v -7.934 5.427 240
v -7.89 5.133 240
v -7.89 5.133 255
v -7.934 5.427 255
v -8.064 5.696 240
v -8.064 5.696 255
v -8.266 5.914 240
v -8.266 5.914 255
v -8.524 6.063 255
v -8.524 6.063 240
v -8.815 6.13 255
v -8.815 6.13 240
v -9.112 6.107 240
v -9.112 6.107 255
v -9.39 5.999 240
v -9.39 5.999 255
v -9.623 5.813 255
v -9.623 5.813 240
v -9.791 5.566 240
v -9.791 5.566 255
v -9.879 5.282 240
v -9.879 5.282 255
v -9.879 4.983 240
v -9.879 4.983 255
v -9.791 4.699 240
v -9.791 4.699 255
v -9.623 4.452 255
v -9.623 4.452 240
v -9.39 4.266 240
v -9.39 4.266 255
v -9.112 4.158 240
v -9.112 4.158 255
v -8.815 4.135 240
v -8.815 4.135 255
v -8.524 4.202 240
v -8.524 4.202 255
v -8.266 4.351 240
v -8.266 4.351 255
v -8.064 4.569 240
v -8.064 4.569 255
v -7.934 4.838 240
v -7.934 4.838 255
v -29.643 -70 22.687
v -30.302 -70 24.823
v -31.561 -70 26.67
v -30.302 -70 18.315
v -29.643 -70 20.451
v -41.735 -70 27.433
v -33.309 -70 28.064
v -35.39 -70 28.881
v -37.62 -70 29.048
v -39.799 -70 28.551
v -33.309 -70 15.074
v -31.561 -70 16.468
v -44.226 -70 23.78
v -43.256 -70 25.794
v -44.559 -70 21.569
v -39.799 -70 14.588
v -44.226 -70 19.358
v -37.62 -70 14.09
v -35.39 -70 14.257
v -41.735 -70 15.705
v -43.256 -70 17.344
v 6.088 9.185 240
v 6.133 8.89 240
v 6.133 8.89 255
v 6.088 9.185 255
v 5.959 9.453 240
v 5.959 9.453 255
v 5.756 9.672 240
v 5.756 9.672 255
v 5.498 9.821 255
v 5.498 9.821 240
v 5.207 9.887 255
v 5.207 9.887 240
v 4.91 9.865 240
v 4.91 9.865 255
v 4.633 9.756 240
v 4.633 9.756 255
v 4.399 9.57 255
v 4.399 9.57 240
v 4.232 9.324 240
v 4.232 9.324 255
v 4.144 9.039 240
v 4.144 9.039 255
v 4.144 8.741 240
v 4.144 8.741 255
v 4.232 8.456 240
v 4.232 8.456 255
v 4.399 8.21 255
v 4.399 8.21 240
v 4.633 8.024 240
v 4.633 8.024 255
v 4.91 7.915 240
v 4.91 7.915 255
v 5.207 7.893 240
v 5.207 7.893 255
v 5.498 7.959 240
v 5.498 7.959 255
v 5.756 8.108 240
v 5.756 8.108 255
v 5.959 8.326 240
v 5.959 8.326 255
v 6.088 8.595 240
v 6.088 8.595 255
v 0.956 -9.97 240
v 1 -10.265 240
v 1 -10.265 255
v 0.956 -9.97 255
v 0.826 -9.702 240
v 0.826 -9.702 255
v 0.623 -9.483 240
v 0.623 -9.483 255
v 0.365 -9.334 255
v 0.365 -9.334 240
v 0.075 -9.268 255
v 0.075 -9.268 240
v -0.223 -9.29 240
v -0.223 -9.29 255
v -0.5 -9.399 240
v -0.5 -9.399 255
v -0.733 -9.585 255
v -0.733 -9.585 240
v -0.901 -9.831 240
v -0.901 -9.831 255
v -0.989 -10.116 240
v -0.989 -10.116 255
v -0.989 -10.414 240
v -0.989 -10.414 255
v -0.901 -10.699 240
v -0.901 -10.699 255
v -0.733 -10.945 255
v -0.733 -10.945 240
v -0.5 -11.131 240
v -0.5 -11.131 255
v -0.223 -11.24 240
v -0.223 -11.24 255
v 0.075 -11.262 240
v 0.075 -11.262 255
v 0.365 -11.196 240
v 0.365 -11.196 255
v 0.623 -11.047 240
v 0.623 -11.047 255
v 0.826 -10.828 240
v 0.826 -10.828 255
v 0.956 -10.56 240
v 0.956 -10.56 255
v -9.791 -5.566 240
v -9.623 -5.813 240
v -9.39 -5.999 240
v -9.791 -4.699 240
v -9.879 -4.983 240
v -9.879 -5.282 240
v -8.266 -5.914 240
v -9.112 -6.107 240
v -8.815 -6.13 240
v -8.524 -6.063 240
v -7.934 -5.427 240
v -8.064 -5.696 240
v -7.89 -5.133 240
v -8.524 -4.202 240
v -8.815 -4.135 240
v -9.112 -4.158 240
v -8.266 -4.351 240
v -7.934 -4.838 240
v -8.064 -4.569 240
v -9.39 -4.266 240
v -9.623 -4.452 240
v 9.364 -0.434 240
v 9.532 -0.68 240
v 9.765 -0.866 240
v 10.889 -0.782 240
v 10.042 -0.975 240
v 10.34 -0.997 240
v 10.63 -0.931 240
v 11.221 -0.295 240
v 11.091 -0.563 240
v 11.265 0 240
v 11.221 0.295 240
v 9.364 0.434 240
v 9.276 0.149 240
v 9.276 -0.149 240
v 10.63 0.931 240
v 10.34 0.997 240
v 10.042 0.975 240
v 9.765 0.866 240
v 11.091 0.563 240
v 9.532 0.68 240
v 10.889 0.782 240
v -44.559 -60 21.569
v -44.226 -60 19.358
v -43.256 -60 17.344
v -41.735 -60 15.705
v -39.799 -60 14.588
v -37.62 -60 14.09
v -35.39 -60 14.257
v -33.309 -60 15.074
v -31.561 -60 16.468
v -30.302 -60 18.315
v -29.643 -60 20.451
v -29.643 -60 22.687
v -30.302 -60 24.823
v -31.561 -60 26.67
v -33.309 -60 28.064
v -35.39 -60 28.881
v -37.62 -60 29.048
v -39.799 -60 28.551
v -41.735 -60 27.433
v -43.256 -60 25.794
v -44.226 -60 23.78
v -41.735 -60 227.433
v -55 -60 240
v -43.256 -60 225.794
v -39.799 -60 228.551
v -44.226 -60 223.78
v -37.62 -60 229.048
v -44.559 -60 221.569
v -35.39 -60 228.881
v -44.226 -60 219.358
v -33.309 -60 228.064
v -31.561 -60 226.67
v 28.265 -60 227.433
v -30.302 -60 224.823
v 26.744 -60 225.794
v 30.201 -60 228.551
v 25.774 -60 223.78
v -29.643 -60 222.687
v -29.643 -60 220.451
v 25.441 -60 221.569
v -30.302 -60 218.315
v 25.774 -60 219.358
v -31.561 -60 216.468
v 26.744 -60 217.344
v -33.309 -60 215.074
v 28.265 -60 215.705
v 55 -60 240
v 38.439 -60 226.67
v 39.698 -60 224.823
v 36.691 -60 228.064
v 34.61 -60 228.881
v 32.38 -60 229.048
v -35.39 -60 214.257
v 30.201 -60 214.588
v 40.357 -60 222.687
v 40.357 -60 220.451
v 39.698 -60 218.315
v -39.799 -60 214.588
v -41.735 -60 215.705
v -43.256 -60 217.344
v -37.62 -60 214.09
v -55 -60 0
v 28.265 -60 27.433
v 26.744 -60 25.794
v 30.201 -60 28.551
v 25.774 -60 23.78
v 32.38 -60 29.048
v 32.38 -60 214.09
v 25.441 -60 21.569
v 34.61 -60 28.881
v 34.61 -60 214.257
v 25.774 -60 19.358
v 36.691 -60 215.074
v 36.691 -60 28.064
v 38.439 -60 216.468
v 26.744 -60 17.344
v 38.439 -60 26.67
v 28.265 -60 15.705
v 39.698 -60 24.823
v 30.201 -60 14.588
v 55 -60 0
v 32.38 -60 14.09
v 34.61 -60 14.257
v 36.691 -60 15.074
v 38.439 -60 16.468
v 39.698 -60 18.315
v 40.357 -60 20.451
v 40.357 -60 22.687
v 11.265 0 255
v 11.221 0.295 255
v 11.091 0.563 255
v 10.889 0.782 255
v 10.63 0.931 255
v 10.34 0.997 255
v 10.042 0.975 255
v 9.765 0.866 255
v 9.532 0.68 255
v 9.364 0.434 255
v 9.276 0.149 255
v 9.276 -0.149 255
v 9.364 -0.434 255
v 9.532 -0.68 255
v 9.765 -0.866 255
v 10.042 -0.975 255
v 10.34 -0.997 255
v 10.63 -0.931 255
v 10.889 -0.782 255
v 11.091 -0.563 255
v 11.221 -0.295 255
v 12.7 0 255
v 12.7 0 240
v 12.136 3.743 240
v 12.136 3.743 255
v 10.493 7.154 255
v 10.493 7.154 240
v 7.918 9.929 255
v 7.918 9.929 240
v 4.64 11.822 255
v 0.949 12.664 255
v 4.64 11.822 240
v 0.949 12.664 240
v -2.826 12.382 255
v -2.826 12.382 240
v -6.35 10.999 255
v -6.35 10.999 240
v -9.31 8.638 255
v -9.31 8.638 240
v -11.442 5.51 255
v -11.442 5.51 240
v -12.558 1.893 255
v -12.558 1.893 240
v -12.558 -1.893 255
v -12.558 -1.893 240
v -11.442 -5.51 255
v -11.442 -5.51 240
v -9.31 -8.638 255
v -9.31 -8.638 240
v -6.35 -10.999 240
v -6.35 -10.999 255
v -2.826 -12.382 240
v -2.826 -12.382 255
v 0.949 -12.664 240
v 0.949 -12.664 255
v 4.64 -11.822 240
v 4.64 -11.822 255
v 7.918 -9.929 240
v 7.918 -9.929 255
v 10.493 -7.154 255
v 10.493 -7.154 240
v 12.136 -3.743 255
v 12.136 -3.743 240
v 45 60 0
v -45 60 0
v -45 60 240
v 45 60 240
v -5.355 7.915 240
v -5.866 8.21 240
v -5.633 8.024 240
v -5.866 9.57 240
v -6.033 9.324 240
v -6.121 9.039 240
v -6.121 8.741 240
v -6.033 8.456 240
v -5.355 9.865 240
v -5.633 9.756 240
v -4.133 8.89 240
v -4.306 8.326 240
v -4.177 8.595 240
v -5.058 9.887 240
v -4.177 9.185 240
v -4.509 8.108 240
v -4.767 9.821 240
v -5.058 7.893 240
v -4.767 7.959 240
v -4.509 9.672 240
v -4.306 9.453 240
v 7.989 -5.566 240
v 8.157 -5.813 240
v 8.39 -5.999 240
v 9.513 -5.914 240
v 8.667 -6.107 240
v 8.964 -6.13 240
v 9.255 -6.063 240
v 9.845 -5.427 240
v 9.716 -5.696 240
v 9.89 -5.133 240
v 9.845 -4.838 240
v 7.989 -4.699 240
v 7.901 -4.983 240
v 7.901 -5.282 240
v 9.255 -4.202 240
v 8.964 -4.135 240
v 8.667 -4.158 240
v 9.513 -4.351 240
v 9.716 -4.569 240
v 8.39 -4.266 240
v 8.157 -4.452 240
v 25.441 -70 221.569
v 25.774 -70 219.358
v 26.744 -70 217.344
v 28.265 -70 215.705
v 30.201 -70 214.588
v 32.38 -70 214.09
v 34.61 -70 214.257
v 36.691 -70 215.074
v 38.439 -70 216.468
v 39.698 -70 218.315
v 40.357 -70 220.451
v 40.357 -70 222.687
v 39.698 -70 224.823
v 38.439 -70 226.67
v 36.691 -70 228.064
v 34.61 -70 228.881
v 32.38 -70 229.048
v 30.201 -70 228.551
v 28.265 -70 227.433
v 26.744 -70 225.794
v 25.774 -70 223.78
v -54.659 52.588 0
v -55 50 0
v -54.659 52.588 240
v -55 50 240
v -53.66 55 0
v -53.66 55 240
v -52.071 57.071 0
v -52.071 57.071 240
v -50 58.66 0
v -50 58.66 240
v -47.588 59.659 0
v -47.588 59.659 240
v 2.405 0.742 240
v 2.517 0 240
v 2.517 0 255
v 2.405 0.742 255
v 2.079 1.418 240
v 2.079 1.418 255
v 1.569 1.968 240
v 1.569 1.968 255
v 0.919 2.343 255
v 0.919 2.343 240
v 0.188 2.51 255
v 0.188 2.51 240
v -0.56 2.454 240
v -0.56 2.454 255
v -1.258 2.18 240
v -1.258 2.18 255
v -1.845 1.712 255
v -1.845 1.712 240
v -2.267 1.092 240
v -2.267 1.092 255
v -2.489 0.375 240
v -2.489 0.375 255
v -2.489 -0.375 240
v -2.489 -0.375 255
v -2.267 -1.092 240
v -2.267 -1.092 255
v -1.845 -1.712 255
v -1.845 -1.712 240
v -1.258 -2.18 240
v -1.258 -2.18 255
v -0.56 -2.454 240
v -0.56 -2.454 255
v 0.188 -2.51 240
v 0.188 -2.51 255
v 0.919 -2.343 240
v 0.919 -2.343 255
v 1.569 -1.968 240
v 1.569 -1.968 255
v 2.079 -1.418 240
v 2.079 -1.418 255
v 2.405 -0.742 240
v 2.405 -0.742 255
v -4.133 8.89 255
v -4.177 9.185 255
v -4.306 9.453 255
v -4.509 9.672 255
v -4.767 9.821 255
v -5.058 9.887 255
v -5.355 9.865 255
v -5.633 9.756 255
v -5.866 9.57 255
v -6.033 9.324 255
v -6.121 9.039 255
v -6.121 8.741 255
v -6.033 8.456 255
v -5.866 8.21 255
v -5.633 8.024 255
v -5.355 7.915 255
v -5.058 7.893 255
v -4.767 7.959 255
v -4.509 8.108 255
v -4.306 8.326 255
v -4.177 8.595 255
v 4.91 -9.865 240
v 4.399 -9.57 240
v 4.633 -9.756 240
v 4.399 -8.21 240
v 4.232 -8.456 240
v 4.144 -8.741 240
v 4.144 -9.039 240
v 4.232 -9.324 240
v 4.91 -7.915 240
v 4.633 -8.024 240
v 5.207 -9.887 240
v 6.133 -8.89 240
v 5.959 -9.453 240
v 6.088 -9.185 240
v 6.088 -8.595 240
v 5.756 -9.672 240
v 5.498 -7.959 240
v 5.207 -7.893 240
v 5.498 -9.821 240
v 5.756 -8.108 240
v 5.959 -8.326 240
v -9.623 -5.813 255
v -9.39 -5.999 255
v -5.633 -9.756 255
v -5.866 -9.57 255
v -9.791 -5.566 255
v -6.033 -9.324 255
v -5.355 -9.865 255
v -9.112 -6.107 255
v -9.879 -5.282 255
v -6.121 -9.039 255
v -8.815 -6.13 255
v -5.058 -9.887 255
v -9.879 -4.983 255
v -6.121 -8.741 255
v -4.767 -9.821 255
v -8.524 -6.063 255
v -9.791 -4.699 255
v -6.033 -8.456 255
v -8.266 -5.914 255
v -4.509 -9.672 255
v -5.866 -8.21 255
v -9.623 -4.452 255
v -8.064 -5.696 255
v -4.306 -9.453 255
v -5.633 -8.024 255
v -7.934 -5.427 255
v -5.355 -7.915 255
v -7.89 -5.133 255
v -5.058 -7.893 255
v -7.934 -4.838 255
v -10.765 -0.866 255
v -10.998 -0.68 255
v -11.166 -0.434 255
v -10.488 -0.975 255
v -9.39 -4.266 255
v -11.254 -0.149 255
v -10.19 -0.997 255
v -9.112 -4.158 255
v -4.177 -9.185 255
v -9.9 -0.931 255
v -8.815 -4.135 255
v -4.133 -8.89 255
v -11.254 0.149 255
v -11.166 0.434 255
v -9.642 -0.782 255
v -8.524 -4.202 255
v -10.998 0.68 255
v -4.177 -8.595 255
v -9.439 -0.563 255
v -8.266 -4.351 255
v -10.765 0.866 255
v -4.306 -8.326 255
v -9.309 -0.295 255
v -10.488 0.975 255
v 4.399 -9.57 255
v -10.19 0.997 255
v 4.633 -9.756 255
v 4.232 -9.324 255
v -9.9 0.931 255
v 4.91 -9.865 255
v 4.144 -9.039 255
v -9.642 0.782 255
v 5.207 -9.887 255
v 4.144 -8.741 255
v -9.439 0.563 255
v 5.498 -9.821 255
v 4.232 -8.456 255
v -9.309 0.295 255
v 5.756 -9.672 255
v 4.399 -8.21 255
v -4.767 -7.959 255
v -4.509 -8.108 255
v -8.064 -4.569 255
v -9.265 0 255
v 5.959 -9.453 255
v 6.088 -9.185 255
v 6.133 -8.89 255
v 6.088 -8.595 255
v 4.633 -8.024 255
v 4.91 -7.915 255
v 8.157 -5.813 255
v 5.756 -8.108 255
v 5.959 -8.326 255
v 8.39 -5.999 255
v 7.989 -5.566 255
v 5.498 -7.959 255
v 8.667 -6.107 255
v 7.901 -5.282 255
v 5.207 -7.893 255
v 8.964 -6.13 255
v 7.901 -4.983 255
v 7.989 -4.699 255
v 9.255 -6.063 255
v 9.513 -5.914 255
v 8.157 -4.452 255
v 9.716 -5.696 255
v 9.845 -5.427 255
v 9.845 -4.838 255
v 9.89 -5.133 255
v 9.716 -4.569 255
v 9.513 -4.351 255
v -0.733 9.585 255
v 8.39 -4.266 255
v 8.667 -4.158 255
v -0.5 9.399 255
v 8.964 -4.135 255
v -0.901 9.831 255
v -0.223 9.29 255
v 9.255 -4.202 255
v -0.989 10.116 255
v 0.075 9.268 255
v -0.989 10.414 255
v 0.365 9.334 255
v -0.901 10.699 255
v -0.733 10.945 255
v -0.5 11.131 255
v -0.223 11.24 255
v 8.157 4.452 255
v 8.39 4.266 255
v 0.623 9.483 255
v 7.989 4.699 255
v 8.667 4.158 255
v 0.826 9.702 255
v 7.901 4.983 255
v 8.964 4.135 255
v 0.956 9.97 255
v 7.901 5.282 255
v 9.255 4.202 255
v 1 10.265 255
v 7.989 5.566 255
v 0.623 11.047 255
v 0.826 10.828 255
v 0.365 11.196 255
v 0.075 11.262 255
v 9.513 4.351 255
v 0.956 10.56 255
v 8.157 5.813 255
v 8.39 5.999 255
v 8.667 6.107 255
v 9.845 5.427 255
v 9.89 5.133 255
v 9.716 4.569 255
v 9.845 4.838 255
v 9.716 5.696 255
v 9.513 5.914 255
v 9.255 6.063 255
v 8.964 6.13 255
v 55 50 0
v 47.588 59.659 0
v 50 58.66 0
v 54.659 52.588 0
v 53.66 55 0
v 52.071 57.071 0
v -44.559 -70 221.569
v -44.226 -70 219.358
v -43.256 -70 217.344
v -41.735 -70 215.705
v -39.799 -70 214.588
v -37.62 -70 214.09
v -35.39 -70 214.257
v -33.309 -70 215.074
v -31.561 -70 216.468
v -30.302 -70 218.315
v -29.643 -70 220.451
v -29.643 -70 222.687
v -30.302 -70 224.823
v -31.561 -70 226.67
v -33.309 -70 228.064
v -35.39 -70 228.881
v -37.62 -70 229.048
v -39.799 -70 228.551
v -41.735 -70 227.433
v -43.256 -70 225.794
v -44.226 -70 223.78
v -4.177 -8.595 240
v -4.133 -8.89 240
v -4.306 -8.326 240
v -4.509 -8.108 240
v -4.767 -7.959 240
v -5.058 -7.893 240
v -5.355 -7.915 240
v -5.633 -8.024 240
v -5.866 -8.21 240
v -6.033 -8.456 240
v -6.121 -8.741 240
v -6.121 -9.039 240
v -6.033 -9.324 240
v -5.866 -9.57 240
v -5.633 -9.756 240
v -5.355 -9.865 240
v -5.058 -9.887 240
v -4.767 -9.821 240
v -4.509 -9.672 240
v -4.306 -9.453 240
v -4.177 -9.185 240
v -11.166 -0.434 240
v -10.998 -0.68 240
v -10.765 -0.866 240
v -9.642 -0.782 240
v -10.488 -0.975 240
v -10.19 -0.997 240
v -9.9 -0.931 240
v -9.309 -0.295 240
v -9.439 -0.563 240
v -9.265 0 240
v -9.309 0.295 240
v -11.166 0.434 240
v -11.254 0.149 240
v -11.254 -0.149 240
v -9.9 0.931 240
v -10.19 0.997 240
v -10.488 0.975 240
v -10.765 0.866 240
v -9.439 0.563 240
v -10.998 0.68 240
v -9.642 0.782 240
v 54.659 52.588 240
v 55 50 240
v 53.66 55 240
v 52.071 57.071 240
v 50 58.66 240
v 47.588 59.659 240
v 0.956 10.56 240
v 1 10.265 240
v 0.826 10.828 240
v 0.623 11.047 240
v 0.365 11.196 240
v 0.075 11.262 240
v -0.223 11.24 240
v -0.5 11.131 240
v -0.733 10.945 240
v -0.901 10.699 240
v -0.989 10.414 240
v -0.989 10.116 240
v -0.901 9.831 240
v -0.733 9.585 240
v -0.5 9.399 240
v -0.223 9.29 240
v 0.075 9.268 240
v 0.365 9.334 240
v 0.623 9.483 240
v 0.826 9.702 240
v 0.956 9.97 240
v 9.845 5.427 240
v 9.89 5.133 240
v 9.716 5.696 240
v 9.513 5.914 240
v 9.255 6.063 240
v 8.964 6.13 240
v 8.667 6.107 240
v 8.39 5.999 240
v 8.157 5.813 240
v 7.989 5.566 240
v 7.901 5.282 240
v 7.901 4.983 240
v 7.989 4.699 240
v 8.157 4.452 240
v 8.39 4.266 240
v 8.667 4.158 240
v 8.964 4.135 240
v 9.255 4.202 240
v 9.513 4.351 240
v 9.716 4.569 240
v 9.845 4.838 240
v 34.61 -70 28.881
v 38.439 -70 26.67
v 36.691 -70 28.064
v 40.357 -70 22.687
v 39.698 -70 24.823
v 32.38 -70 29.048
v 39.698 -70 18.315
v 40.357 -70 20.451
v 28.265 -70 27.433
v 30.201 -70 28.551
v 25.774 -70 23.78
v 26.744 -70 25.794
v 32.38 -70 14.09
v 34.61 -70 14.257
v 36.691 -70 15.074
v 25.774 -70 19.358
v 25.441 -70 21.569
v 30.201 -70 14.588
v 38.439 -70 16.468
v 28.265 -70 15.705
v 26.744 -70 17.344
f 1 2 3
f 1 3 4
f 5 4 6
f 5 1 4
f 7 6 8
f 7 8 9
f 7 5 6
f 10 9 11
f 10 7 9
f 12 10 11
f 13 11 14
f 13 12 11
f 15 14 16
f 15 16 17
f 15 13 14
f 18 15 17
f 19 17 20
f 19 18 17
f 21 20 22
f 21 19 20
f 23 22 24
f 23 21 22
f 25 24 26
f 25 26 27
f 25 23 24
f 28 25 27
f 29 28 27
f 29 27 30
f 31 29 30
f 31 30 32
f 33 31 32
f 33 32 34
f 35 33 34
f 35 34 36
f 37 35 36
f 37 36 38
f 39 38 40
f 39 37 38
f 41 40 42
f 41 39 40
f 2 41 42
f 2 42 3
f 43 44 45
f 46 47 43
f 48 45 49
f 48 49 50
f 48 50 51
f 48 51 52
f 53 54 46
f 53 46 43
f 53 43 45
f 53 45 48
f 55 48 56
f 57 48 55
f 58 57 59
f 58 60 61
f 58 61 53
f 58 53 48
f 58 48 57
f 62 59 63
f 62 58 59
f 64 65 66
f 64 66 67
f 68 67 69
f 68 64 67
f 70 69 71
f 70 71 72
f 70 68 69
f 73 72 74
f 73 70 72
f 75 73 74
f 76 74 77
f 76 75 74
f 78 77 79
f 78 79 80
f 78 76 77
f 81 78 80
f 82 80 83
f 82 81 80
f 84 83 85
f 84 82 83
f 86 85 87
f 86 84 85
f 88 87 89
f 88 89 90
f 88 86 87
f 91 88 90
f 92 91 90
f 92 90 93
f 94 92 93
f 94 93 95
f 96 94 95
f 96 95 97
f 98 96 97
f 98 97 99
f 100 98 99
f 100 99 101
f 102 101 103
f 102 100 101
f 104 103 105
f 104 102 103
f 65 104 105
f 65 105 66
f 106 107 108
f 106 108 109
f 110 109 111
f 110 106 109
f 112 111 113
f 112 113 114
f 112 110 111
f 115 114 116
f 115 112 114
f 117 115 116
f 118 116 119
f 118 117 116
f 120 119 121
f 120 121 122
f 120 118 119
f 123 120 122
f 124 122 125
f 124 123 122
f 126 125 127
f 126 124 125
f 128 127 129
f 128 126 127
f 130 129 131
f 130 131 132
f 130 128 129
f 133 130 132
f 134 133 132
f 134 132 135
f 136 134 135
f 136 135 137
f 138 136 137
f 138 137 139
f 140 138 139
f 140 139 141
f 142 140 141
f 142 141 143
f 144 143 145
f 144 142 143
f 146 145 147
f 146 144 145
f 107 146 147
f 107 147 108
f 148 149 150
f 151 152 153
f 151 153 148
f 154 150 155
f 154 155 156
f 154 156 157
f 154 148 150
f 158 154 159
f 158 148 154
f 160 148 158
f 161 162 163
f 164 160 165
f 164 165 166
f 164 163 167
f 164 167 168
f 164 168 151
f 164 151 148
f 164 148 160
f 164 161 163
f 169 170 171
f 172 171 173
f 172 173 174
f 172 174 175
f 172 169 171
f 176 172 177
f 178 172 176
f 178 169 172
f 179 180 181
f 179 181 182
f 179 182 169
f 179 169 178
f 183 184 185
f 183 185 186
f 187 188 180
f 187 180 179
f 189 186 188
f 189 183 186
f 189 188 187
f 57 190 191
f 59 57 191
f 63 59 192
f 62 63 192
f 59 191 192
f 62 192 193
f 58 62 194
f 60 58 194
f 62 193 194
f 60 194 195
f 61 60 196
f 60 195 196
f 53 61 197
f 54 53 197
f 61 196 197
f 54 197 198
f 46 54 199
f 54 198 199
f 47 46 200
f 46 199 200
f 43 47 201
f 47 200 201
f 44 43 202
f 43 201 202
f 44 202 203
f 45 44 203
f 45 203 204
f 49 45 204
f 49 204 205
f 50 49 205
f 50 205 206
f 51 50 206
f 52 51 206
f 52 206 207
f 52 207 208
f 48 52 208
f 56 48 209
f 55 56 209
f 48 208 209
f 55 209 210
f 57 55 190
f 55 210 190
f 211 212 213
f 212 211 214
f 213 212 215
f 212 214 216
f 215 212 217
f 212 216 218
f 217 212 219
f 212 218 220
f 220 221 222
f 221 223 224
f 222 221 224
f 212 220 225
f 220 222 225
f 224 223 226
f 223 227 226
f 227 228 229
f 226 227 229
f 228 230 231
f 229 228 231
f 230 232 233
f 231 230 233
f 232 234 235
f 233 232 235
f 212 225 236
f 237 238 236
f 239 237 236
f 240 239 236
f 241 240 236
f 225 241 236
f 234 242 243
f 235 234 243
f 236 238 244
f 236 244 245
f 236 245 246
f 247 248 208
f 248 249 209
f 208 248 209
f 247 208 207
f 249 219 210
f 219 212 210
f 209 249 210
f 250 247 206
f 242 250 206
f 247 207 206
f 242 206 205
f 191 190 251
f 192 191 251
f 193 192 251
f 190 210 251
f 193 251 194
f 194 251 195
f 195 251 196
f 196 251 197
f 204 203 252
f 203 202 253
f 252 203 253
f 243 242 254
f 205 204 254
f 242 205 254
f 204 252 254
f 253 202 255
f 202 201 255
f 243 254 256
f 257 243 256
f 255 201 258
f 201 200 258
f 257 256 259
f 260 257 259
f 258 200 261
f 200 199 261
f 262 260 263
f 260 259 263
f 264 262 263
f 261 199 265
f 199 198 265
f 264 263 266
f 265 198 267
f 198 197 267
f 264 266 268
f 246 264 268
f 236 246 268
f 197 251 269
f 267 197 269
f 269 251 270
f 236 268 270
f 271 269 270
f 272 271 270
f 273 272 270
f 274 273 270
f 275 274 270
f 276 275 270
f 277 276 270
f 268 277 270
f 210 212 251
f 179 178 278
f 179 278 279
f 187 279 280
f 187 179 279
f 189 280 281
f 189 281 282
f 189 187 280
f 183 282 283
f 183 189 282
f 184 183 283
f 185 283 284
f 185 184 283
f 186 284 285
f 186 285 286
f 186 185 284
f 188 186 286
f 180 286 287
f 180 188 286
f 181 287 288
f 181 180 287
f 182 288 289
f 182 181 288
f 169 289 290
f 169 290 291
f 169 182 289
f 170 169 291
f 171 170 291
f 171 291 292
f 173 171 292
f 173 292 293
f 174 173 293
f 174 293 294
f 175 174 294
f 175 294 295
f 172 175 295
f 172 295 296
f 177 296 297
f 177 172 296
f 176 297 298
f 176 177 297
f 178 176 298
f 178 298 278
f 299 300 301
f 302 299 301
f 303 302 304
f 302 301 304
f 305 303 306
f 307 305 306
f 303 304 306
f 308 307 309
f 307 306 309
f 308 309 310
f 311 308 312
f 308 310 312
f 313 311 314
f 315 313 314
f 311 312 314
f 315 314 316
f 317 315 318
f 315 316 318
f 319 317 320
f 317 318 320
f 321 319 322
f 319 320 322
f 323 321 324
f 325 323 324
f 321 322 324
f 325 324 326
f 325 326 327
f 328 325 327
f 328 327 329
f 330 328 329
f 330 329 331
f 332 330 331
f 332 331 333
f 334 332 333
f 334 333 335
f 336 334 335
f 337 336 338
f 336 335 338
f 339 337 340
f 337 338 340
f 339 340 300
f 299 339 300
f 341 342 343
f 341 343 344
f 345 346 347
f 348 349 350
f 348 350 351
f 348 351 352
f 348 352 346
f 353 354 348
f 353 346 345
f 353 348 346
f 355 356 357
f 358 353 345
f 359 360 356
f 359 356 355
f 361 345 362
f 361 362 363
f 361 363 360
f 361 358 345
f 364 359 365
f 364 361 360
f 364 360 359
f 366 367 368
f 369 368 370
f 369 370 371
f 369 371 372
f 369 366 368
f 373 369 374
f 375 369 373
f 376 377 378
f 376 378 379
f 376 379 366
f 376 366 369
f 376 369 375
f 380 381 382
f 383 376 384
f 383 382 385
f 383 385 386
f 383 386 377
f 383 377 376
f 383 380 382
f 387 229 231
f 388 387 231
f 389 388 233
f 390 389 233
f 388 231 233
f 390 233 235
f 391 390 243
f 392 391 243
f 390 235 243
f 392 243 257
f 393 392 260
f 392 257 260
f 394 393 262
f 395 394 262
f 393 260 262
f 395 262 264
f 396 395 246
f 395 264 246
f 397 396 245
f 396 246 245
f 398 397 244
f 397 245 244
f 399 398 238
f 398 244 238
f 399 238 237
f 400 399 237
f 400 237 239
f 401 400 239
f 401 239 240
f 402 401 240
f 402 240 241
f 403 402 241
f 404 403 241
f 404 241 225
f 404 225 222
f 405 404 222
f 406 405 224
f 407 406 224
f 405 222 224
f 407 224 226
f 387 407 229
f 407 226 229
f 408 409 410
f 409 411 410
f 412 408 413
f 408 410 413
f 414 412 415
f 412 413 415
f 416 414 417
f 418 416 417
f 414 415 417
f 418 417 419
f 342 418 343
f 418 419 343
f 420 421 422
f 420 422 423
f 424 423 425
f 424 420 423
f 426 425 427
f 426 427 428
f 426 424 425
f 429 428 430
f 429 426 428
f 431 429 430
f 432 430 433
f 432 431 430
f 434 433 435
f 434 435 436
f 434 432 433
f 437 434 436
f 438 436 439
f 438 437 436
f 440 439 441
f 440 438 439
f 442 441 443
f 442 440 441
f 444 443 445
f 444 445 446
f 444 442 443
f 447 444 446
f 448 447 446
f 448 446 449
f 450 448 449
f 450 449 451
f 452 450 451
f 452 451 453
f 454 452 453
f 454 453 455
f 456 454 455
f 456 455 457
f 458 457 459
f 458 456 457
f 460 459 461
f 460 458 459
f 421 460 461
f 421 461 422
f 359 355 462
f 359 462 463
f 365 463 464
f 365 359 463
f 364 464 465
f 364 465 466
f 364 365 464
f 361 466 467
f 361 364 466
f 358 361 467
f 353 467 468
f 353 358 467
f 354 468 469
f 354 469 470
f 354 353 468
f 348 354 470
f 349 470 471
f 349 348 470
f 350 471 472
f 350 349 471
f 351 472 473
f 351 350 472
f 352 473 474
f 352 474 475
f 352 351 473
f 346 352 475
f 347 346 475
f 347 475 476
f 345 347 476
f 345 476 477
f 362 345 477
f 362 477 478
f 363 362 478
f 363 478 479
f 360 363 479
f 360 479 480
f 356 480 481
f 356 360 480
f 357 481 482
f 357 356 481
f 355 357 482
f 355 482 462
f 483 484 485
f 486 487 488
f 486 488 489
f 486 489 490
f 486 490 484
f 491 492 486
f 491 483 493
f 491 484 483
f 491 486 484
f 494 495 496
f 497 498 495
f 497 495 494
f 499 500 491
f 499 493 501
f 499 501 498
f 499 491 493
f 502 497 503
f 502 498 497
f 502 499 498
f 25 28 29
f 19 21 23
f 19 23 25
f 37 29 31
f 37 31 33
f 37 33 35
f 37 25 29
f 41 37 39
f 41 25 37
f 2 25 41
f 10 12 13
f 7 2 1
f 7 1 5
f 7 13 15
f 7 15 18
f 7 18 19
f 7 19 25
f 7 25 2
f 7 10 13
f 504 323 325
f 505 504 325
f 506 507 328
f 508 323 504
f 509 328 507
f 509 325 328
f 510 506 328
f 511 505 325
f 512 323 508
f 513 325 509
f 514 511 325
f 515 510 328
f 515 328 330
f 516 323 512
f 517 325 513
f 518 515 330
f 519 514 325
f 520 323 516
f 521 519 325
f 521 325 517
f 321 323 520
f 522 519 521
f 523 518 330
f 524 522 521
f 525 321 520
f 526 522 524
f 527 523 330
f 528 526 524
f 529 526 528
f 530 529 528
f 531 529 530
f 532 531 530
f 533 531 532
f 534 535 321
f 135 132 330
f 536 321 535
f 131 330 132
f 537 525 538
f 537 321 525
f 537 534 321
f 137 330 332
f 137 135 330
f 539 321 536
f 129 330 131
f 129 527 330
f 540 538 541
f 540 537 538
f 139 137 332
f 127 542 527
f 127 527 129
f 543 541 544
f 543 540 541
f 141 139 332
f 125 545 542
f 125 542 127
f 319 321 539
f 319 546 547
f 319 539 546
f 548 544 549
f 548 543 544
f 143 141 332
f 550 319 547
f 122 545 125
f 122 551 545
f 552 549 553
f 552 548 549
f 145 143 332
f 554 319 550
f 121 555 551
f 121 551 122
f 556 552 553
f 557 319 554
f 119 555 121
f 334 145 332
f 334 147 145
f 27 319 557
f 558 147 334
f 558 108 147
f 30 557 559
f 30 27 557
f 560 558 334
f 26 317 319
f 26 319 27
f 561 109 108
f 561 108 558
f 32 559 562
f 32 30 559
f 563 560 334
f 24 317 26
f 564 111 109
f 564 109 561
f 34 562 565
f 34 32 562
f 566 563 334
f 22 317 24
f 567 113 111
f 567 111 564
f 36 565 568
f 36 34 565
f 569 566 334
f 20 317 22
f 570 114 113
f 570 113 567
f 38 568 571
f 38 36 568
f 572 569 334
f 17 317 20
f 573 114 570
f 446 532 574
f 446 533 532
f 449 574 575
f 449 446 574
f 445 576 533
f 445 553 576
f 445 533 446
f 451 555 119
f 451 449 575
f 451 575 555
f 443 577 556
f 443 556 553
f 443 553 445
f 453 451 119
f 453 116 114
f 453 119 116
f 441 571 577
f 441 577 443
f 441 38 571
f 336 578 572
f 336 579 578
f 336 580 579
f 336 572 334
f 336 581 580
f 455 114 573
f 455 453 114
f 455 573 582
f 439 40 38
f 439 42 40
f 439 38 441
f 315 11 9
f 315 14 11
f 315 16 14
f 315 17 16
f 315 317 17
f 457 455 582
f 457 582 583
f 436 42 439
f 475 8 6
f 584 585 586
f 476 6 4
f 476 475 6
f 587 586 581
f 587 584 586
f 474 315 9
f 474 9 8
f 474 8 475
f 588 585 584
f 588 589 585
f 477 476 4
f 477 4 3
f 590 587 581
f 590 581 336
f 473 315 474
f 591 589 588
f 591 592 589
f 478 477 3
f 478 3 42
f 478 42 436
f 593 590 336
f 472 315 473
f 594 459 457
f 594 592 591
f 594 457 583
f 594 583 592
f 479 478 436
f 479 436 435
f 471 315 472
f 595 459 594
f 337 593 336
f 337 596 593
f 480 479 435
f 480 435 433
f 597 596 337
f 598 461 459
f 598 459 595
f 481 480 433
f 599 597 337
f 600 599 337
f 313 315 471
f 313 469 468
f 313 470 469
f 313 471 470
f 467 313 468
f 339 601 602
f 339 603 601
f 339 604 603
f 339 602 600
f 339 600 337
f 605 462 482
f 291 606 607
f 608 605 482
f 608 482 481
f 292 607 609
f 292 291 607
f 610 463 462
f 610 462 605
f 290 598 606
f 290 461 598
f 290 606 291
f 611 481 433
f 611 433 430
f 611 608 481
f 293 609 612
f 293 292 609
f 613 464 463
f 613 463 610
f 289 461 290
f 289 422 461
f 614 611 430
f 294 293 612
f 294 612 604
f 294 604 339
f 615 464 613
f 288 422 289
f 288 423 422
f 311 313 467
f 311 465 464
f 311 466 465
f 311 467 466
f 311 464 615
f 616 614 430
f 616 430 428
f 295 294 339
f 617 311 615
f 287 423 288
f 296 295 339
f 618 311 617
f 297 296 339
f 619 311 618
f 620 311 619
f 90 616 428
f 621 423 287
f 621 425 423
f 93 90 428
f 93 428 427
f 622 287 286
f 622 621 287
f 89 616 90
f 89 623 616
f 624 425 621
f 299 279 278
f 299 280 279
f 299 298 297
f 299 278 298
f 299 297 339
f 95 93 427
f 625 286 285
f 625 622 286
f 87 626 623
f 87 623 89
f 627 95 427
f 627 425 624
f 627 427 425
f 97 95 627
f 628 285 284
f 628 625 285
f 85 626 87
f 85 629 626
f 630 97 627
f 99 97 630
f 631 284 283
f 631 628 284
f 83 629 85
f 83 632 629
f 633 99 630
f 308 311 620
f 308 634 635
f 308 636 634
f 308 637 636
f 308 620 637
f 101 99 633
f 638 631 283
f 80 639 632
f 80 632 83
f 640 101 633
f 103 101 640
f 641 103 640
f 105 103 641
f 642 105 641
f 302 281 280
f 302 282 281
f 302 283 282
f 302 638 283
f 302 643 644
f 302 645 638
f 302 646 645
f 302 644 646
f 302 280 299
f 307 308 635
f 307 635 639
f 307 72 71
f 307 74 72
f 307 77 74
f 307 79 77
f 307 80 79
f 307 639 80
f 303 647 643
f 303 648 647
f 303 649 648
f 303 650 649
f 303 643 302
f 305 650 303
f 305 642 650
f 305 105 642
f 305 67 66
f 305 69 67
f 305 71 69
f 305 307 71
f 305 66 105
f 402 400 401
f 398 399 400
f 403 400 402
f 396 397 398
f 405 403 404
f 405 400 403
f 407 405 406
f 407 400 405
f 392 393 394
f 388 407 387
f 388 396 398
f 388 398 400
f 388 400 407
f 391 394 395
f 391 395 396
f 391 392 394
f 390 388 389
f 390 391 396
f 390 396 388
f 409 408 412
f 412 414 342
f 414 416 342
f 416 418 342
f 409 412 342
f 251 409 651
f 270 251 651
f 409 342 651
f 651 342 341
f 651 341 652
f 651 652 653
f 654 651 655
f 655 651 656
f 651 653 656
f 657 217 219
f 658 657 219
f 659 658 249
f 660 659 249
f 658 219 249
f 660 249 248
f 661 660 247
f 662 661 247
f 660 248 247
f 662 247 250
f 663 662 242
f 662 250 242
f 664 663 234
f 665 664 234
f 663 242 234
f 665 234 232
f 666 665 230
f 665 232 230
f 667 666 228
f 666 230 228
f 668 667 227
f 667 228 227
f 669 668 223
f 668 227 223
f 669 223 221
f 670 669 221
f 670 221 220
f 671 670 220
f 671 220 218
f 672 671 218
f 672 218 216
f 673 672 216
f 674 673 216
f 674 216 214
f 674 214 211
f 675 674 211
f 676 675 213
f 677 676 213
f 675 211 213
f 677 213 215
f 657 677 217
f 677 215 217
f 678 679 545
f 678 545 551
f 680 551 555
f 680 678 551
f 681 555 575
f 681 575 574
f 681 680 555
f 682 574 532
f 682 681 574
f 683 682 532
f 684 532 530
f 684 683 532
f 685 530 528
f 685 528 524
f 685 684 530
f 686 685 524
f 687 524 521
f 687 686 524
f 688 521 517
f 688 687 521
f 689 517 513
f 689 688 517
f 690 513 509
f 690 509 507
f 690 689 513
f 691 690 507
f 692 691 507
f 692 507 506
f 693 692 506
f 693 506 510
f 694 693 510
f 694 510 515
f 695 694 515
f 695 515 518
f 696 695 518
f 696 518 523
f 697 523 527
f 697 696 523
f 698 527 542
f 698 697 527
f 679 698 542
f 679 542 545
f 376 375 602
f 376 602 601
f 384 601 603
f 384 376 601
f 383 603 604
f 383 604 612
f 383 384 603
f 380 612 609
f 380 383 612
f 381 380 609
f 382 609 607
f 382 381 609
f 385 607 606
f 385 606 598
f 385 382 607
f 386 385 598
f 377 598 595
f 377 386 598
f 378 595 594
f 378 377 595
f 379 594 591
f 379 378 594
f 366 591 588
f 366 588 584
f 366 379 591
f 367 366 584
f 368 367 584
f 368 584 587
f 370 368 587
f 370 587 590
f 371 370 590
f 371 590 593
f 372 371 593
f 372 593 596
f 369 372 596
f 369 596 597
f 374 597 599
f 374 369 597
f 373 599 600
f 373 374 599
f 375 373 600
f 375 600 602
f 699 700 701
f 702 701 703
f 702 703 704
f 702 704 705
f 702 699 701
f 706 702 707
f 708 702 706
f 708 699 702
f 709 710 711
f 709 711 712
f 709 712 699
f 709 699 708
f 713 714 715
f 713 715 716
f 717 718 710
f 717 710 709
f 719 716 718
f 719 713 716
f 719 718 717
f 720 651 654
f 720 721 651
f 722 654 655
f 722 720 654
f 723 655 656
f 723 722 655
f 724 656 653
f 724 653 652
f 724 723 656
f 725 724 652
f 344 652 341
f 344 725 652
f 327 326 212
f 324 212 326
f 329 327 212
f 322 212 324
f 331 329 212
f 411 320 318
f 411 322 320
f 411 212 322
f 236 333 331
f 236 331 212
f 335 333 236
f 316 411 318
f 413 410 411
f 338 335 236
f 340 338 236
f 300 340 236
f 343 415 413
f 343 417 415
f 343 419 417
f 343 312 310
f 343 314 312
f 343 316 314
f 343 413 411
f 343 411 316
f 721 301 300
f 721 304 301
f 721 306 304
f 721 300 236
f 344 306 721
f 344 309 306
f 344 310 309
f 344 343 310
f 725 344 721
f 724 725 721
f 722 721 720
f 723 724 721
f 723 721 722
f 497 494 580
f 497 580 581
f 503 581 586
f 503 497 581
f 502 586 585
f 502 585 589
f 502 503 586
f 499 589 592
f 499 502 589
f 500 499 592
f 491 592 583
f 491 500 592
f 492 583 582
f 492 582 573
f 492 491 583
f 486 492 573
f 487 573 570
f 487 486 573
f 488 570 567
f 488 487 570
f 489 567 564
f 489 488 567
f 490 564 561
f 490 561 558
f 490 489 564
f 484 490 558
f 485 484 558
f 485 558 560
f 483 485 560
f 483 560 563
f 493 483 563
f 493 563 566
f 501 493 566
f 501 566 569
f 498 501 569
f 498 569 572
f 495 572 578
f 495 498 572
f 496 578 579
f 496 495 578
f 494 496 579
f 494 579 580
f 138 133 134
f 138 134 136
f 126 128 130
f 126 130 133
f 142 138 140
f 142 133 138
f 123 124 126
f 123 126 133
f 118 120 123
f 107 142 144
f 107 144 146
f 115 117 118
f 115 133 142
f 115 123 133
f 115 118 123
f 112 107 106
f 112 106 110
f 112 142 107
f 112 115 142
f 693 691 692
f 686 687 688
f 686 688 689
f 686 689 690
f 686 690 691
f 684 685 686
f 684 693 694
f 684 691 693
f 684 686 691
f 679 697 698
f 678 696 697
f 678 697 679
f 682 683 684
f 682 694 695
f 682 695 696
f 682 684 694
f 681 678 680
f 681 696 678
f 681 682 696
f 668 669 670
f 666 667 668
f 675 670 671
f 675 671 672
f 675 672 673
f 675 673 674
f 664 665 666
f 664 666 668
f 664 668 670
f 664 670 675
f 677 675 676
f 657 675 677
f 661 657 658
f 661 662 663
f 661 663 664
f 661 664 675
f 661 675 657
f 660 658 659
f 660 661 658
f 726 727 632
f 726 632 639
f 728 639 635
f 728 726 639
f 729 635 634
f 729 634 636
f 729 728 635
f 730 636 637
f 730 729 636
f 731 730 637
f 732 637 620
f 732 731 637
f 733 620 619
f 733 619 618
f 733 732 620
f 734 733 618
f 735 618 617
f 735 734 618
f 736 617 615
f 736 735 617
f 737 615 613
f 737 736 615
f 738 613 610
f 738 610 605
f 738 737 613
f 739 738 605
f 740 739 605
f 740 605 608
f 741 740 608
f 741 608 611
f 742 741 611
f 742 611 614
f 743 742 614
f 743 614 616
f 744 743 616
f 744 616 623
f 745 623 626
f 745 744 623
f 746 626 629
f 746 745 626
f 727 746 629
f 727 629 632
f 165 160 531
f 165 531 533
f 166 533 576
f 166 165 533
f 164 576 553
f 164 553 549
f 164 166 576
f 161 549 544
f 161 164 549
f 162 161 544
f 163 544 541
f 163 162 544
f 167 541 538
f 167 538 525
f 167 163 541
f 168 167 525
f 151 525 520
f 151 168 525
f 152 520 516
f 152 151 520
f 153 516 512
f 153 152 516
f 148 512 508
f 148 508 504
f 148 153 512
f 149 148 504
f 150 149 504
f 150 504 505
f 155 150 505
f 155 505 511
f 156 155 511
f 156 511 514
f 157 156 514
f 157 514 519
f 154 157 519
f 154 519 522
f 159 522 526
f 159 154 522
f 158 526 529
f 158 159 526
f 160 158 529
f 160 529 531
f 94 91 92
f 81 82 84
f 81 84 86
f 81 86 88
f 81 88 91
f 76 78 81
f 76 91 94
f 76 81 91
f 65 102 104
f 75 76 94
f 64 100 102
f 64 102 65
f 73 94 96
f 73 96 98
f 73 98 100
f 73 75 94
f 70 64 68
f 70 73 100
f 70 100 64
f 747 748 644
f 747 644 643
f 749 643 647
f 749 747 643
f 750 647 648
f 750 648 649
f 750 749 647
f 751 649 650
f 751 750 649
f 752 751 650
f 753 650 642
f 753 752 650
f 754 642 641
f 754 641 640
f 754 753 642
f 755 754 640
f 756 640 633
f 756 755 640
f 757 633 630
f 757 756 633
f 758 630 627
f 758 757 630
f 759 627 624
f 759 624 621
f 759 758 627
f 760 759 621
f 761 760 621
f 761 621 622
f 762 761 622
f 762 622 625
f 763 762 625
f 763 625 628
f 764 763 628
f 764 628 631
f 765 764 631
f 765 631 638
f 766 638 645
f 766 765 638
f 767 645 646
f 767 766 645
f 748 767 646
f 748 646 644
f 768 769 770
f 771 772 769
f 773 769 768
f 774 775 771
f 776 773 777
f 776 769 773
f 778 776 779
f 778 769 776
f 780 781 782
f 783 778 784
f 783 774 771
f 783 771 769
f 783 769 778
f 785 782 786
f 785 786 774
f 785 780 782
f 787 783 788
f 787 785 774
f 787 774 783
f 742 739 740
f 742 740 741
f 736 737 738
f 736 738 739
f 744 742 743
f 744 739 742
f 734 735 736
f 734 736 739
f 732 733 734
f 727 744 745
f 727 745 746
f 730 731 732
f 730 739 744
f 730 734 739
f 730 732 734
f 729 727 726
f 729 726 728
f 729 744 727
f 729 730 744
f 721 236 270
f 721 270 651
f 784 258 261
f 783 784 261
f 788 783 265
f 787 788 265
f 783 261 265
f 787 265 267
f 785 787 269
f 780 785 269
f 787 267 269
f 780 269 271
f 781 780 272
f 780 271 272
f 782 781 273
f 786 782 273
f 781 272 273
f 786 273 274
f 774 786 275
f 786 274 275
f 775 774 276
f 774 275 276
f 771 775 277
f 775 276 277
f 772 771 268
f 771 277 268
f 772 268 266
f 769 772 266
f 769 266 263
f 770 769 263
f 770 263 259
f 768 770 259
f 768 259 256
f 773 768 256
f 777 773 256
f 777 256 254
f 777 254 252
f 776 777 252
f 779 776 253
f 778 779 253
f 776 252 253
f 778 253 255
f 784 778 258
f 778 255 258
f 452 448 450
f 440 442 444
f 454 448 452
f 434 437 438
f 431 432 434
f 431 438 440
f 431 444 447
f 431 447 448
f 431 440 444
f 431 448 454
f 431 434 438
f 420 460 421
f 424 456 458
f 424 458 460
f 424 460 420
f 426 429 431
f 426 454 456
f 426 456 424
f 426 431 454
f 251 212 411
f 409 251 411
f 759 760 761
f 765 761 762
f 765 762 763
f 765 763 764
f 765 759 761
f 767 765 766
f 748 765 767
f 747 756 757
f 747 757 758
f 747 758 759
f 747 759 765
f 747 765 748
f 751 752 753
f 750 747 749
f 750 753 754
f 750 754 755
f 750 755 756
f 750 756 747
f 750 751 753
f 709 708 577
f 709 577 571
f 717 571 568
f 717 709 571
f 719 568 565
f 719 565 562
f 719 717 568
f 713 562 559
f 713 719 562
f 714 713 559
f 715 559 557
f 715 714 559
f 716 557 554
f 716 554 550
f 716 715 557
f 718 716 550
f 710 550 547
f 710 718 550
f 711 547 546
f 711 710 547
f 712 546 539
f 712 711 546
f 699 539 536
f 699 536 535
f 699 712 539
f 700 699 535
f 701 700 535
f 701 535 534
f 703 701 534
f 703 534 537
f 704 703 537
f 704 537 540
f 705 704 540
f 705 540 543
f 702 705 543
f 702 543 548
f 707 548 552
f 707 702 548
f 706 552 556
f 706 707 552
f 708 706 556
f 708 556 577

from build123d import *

# Parameters (mm, degrees)
SKETCH1_W           = 110
SKETCH1_H           = 120
BOSS_EXTRUDE1_DEPTH = 240
FILLET1_R           = 10
SKETCH2_R           = 7.5
BOSS_EXTRUDE2_DEPTH = 10
SKETCH3_R           = 12.7
SKETCH3_R_2         = 2.516719654
SKETCH3_R_3         = 1
BOSS_EXTRUDE3_DEPTH = 15


with BuildPart() as part:
    # Sketch1 → Boss-Extrude1 (new body)
    with BuildSketch(Plane.XY):
        Rectangle(SKETCH1_W, SKETCH1_H)
    extrude(amount=BOSS_EXTRUDE1_DEPTH)

    # Fillet1
    fillet1_edges = [part.edges().sort_by_distance(p)[0] for p in [
        (-55, 60, 120),
        (55, 60, 120),
    ]]
    fillet(fillet1_edges, radius=FILLET1_R)

    # Sketch2 → Boss-Extrude2 (add)
    with BuildSketch(Plane.XZ.offset(60)):
        with Locations(Location((-37.059126993, 221.569070344, 0), (0, 0, 180))):
            Circle(SKETCH2_R)
        with Locations(Location((32.940873007, 221.569070344, 0), (0, 0, 180))):
            Circle(SKETCH2_R)
        with Locations(Location((32.940873007, 21.569070344, 0), (0, 0, 180))):
            Circle(SKETCH2_R)
        with Locations(Location((-37.059126993, 21.569070344, 0), (0, 0, 180))):
            Circle(SKETCH2_R)
    extrude(amount=BOSS_EXTRUDE2_DEPTH)

    # Sketch3 → Boss-Extrude3 (add)
    with BuildSketch(Plane.XY.offset(240)):
        Circle(SKETCH3_R)
        Circle(SKETCH3_R_2, mode=Mode.SUBTRACT)
        with Locations((-10.265012075, 0)):
            Circle(SKETCH3_R_3, mode=Mode.SUBTRACT)
        with Locations((-8.889761227, 5.132506037)):
            Circle(SKETCH3_R_3, mode=Mode.SUBTRACT)
        with Locations((-5.132506037, 8.889761227)):
            Circle(SKETCH3_R_3, mode=Mode.SUBTRACT)
        with Locations((0, 10.265012075)):
            Circle(SKETCH3_R_3, mode=Mode.SUBTRACT)
        with Locations((5.132506037, 8.889761227)):
            Circle(SKETCH3_R_3, mode=Mode.SUBTRACT)
        with Locations((8.889761227, 5.132506037)):
            Circle(SKETCH3_R_3, mode=Mode.SUBTRACT)
        with Locations((10.265012075, 0)):
            Circle(SKETCH3_R_3, mode=Mode.SUBTRACT)
        with Locations((8.889761227, -5.132506037)):
            Circle(SKETCH3_R_3, mode=Mode.SUBTRACT)
        with Locations((5.132506037, -8.889761227)):
            Circle(SKETCH3_R_3, mode=Mode.SUBTRACT)
        with Locations((0, -10.265012075)):
            Circle(SKETCH3_R_3, mode=Mode.SUBTRACT)
        with Locations((-5.132506037, -8.889761227)):
            Circle(SKETCH3_R_3, mode=Mode.SUBTRACT)
        with Locations((-8.889761227, -5.132506037)):
            Circle(SKETCH3_R_3, mode=Mode.SUBTRACT)
    extrude(amount=BOSS_EXTRUDE3_DEPTH)


solid = part.part
